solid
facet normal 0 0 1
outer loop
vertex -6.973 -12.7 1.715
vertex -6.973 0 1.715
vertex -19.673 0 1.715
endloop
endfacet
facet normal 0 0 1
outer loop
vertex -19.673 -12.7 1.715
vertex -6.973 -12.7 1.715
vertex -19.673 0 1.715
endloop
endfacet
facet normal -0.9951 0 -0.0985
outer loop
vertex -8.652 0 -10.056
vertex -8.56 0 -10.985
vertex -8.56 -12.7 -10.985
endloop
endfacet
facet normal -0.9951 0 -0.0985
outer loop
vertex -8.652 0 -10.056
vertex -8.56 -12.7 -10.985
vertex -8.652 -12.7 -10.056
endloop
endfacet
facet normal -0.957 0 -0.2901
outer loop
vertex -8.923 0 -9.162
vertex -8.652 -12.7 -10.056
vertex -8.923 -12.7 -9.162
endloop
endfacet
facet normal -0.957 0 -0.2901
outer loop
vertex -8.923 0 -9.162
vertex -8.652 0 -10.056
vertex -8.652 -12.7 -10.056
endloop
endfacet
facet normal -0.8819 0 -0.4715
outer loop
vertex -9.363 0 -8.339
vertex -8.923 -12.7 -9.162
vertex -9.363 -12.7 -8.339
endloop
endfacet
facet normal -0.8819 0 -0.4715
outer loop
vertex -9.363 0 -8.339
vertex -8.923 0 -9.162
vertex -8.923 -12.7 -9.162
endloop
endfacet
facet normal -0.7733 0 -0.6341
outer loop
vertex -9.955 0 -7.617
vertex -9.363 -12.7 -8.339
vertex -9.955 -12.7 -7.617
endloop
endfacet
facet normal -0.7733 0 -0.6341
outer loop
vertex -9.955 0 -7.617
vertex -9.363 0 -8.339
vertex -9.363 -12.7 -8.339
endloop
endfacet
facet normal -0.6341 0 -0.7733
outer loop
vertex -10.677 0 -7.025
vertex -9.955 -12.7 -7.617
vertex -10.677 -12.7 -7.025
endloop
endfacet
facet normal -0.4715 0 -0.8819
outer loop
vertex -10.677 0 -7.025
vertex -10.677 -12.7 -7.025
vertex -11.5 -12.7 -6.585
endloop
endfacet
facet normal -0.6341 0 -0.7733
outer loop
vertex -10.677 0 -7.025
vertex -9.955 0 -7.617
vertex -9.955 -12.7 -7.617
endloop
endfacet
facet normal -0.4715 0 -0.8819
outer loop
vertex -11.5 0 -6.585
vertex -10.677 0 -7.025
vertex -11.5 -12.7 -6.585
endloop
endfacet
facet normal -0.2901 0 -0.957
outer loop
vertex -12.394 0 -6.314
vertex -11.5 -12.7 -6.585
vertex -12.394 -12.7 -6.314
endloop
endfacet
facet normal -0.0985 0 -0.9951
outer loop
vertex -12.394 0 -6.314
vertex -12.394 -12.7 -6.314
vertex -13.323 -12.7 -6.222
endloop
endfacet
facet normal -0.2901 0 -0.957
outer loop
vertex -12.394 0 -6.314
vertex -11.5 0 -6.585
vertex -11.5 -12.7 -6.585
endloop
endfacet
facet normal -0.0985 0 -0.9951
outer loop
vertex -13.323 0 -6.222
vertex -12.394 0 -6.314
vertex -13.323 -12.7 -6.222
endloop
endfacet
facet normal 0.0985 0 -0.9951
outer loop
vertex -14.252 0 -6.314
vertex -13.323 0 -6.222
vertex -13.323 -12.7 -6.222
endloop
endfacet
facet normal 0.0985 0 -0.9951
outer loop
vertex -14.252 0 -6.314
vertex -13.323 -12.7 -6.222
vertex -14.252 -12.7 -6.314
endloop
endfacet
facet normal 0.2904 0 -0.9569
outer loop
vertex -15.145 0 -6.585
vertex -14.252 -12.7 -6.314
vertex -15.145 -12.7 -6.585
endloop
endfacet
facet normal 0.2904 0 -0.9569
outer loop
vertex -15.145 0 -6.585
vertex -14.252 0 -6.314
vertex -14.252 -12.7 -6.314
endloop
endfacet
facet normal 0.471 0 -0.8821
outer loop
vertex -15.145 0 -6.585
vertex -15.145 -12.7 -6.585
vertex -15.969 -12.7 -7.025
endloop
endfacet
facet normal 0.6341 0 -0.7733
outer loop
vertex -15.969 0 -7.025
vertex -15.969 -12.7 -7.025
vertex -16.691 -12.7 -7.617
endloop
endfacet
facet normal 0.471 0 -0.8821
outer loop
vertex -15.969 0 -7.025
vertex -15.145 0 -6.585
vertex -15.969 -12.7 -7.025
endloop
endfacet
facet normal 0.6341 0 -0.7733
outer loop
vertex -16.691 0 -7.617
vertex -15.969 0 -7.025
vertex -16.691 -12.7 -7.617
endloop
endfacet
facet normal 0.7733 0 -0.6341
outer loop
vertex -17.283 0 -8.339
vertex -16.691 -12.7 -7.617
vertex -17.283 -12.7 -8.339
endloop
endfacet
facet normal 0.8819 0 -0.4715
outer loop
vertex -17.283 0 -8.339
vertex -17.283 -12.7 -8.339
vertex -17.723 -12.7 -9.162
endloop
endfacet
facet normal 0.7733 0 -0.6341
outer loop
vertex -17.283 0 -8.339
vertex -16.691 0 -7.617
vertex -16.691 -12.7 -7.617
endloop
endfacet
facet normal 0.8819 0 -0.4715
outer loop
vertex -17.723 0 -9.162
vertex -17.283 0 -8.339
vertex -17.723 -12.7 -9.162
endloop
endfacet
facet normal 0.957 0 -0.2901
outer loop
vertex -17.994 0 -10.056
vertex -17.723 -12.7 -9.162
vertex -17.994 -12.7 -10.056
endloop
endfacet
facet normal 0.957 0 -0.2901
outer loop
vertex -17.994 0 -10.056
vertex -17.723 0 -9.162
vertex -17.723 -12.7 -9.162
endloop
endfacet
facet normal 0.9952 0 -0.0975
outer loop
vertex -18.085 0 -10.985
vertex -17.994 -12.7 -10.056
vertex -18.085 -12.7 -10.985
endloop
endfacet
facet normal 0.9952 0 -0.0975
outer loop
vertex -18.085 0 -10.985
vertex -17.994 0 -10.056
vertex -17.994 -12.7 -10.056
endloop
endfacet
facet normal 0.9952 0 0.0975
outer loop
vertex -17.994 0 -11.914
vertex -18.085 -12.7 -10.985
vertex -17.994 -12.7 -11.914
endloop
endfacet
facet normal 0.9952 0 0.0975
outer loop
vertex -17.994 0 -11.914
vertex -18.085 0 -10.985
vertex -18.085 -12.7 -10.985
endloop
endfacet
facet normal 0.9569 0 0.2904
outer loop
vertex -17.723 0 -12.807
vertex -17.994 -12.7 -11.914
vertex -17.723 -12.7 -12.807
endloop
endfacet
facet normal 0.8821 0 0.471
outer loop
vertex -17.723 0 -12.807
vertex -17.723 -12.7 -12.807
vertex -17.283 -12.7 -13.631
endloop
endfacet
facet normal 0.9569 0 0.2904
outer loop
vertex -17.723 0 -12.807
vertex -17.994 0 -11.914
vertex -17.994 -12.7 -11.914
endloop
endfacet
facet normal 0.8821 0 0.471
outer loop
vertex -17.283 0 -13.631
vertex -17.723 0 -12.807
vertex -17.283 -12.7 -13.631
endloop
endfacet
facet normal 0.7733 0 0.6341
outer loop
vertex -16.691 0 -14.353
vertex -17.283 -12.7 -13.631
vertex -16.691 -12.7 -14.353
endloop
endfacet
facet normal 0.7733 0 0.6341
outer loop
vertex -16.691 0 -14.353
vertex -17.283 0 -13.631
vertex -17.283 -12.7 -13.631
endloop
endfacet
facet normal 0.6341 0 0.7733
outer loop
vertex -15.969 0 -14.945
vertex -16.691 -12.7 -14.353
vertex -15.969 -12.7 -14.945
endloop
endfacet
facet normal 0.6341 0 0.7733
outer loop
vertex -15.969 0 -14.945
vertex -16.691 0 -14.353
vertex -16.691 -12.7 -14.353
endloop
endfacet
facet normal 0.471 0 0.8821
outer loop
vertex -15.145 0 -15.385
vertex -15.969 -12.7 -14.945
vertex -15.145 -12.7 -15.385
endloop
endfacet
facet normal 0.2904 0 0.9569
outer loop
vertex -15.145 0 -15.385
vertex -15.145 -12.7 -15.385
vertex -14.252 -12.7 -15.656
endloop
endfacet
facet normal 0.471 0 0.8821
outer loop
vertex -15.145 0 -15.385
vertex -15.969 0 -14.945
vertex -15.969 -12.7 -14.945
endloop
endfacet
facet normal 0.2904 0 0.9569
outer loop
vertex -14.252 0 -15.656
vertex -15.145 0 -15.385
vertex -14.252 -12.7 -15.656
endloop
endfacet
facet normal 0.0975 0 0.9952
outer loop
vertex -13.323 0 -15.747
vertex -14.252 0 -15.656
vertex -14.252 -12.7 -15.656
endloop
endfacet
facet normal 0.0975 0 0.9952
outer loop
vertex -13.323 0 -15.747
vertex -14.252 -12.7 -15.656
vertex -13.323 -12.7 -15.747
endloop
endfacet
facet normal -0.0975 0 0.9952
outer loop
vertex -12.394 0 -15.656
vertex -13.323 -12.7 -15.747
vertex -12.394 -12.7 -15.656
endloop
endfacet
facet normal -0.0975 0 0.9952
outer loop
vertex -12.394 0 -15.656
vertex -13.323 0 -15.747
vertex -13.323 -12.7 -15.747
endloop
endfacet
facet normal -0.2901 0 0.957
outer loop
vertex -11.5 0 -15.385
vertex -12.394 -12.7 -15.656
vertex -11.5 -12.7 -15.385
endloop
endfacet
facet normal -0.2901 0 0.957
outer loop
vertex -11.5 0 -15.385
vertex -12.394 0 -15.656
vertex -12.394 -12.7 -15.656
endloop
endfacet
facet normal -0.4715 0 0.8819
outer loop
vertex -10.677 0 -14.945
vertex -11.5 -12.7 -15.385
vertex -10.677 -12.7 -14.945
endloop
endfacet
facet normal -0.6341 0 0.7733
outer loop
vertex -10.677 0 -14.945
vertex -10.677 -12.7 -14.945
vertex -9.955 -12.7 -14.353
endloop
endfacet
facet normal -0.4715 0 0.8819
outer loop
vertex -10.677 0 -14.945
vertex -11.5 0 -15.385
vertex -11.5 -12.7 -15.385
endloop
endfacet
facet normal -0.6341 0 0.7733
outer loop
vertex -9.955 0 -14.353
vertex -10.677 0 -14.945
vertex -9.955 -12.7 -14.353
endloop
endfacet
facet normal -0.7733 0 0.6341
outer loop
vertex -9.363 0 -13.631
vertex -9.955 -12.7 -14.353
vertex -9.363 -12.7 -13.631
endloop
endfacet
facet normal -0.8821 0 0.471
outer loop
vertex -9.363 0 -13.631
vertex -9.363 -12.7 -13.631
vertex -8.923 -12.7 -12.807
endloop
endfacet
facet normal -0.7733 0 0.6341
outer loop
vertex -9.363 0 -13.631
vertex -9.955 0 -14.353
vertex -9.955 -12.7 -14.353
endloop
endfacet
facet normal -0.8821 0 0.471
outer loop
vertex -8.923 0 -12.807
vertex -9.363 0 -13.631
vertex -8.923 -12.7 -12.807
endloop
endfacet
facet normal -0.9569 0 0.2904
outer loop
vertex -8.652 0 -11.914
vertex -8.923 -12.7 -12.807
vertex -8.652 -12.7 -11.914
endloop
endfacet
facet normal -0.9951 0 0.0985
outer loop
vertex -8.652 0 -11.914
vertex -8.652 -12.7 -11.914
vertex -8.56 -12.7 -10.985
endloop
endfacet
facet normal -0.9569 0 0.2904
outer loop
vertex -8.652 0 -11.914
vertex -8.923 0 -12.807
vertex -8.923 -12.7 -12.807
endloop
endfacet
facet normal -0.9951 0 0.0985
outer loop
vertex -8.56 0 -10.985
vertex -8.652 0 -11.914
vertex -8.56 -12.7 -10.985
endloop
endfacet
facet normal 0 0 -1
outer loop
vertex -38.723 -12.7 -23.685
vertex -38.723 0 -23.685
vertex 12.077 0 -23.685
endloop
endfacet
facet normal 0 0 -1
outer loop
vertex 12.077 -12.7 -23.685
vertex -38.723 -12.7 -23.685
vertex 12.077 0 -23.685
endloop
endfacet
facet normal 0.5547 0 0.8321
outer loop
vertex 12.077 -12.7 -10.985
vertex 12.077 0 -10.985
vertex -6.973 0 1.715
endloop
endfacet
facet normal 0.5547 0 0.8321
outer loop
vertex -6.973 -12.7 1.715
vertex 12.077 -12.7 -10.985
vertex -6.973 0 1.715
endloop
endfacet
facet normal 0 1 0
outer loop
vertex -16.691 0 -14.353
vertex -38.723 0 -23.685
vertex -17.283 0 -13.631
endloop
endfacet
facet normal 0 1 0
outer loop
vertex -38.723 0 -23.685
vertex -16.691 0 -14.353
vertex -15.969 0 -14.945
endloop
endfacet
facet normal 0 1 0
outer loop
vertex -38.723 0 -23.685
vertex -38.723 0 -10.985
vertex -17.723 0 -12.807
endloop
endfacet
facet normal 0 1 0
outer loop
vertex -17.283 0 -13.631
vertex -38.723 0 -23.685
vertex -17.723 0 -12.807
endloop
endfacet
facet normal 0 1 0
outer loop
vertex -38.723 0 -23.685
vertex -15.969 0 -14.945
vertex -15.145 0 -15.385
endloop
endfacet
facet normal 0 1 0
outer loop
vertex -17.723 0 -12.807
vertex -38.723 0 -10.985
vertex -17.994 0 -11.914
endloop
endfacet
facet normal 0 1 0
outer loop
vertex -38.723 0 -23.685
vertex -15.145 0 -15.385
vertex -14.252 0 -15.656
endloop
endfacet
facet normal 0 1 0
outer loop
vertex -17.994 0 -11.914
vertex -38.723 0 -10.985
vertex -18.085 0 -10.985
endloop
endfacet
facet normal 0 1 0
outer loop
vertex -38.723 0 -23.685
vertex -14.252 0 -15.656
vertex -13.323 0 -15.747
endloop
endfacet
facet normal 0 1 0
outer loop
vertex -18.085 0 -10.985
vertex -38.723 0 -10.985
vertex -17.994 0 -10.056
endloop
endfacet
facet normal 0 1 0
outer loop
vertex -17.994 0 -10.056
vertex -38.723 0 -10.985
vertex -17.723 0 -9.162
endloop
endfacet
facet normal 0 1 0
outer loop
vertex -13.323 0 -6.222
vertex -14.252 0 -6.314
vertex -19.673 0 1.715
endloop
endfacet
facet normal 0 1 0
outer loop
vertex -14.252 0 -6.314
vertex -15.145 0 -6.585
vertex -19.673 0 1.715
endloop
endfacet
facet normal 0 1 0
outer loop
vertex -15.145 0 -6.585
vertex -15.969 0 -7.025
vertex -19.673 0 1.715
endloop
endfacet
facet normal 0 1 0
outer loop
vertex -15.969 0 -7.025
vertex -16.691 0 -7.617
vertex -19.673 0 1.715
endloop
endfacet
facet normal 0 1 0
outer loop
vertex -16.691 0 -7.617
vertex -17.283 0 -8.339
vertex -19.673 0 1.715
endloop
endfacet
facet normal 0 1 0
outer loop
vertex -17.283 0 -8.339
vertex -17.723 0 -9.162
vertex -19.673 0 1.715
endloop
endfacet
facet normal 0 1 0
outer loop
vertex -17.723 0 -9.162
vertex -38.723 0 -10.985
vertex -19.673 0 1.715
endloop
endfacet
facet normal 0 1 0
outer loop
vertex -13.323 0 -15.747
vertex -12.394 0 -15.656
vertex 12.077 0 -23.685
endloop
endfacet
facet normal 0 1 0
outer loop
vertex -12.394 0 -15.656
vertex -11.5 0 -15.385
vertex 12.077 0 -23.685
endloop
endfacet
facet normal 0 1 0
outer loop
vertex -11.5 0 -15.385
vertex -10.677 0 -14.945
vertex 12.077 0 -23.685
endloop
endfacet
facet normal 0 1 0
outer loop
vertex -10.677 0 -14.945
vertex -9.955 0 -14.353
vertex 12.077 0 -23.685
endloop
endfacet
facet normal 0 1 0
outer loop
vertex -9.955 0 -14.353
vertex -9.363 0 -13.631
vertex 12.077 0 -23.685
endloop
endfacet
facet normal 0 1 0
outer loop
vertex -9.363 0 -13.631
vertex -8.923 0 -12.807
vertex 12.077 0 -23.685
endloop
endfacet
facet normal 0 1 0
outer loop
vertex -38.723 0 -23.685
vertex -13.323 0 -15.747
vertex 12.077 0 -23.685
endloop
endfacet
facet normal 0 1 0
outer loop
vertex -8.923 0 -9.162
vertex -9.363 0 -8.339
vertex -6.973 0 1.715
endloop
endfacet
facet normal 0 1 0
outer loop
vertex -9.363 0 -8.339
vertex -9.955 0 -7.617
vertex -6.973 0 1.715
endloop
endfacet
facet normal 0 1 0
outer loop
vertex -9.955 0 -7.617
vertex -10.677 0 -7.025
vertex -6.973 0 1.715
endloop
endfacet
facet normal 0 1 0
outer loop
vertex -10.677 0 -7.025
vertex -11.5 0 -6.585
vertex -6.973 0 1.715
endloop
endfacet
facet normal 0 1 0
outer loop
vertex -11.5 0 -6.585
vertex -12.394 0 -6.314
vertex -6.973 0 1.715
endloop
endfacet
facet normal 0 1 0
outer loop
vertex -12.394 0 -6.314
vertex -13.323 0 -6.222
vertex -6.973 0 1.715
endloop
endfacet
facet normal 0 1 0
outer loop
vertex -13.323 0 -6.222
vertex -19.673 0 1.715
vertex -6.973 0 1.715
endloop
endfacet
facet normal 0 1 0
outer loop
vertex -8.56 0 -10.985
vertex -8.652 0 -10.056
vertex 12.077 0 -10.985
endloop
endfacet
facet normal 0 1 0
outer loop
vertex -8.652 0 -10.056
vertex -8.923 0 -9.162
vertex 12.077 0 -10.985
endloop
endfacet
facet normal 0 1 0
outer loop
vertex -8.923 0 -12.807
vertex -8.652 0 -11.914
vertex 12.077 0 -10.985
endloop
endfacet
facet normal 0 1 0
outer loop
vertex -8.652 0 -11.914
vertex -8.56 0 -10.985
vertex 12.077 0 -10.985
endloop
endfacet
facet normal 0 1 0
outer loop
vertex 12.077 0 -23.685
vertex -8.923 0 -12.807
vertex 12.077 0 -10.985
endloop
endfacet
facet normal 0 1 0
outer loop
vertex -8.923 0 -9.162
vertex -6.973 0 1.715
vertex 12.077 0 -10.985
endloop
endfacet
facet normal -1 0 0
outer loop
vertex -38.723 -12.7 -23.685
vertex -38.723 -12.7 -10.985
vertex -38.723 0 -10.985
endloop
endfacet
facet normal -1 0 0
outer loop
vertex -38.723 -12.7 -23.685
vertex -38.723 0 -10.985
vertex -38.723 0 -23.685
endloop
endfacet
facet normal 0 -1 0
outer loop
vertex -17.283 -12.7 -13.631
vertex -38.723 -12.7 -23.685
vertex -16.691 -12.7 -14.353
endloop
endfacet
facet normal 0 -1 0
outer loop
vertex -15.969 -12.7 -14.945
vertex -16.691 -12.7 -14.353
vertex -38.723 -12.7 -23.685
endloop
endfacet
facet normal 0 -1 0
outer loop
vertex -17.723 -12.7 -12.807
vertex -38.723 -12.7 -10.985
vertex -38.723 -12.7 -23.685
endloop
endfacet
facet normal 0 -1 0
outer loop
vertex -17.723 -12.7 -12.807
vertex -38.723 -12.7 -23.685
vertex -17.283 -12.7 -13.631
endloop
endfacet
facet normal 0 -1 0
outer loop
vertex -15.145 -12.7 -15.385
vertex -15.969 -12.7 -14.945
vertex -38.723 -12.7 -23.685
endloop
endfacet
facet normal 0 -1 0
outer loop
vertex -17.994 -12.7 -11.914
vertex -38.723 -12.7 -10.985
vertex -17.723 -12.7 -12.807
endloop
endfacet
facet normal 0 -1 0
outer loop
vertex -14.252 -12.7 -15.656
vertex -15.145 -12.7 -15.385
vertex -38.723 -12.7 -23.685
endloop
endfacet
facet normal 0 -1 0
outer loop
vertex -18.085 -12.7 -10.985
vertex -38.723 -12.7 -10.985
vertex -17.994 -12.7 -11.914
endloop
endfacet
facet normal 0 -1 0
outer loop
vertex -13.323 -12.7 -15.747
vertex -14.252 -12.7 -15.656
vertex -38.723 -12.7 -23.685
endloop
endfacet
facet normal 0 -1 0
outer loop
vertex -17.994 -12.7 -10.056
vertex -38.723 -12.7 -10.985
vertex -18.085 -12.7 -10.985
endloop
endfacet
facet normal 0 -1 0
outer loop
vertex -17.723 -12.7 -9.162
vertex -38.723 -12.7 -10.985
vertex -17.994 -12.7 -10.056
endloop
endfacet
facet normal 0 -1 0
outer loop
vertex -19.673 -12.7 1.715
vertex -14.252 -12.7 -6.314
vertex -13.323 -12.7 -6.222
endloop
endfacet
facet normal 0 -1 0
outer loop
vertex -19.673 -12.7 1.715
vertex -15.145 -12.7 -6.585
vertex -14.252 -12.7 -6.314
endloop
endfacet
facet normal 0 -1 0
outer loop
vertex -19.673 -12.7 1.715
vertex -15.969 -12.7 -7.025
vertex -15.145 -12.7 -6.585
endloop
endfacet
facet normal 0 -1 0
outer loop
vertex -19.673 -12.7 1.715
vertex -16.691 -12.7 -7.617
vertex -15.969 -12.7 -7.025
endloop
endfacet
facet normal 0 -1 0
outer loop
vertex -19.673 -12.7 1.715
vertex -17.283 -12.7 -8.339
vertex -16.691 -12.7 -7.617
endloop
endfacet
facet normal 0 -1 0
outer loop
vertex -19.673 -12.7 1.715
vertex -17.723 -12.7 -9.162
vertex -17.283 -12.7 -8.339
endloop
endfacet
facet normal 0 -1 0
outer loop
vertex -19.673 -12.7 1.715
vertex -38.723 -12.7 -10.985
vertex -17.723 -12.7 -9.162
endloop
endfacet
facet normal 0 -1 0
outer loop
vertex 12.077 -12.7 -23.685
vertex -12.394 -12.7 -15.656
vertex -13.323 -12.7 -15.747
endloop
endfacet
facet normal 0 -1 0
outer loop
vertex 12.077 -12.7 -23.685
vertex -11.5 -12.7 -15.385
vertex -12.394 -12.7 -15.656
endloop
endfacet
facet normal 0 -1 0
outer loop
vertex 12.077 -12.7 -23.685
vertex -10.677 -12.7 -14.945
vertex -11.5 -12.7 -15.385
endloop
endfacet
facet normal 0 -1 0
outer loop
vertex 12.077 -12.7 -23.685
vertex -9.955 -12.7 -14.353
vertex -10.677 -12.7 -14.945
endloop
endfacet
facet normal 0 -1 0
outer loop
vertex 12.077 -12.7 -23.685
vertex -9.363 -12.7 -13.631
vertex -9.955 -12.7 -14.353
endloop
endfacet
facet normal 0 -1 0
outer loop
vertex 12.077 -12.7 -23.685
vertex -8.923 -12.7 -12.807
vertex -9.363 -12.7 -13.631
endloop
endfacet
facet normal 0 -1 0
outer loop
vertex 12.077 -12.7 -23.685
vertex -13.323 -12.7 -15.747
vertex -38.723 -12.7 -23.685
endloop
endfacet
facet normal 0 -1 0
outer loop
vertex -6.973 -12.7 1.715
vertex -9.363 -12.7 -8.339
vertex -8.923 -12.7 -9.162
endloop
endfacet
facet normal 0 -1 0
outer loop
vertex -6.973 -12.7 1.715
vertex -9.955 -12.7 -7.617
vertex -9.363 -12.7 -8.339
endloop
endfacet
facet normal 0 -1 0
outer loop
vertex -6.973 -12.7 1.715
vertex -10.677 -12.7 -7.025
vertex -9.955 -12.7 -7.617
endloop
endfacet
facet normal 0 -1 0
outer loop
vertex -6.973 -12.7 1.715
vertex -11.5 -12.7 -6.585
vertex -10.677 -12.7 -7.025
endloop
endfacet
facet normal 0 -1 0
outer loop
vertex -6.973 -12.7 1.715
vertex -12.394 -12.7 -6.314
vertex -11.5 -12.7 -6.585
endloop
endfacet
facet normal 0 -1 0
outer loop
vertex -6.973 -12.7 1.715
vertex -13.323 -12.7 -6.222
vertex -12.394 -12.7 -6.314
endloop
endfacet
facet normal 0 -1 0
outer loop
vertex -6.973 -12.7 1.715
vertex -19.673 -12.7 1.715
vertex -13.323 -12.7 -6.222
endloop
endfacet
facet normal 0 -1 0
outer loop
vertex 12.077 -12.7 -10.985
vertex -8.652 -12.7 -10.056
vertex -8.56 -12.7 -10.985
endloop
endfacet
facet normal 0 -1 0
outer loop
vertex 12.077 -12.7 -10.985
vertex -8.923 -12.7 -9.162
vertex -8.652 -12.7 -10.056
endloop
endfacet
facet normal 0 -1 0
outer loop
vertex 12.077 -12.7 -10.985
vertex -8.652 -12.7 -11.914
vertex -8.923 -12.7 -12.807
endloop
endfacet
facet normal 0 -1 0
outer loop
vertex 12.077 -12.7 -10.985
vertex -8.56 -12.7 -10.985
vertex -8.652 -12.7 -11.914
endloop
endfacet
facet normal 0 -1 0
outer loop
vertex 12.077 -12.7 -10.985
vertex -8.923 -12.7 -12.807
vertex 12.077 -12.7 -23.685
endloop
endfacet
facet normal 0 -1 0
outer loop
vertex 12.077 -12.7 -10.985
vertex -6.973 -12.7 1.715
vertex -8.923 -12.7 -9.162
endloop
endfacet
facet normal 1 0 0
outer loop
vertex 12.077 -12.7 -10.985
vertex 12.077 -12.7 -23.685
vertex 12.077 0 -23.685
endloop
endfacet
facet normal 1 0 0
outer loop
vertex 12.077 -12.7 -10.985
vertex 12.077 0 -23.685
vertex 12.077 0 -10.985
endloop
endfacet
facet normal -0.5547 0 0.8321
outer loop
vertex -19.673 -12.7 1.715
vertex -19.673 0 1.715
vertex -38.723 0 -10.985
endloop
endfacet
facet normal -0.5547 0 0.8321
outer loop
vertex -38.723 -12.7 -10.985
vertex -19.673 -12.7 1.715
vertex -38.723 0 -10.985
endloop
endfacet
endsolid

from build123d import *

# Parameters (mm, degrees)
F0_R     = 4.7625
F1_DEPTH = 12.7


with BuildPart() as f1:
    # F0 (on Front) → F1 (new body)
    with BuildSketch(Plane.XZ):
        Polygon((-38.722962, -10.984917), (-38.722962, -23.684917), (12.077038, -23.684917), (12.077038, -10.984917), (-6.972962, -10.984917), (-6.972962, 1.715083), (-19.672962, 1.715083), (-19.672962, -10.984917), align=None)
        with Locations((-13.322962, -10.984917)):
            Circle(F0_R, mode=Mode.SUBTRACT)
        Polygon((-19.672962, 1.715083), (-38.722962, -10.984917), (-19.672962, -10.984917), align=None)
        Polygon((-6.972962, -10.984917), (12.077038, -10.984917), (-6.972962, 1.715083), align=None)
    extrude(amount=F1_DEPTH)


solid = f1.part
